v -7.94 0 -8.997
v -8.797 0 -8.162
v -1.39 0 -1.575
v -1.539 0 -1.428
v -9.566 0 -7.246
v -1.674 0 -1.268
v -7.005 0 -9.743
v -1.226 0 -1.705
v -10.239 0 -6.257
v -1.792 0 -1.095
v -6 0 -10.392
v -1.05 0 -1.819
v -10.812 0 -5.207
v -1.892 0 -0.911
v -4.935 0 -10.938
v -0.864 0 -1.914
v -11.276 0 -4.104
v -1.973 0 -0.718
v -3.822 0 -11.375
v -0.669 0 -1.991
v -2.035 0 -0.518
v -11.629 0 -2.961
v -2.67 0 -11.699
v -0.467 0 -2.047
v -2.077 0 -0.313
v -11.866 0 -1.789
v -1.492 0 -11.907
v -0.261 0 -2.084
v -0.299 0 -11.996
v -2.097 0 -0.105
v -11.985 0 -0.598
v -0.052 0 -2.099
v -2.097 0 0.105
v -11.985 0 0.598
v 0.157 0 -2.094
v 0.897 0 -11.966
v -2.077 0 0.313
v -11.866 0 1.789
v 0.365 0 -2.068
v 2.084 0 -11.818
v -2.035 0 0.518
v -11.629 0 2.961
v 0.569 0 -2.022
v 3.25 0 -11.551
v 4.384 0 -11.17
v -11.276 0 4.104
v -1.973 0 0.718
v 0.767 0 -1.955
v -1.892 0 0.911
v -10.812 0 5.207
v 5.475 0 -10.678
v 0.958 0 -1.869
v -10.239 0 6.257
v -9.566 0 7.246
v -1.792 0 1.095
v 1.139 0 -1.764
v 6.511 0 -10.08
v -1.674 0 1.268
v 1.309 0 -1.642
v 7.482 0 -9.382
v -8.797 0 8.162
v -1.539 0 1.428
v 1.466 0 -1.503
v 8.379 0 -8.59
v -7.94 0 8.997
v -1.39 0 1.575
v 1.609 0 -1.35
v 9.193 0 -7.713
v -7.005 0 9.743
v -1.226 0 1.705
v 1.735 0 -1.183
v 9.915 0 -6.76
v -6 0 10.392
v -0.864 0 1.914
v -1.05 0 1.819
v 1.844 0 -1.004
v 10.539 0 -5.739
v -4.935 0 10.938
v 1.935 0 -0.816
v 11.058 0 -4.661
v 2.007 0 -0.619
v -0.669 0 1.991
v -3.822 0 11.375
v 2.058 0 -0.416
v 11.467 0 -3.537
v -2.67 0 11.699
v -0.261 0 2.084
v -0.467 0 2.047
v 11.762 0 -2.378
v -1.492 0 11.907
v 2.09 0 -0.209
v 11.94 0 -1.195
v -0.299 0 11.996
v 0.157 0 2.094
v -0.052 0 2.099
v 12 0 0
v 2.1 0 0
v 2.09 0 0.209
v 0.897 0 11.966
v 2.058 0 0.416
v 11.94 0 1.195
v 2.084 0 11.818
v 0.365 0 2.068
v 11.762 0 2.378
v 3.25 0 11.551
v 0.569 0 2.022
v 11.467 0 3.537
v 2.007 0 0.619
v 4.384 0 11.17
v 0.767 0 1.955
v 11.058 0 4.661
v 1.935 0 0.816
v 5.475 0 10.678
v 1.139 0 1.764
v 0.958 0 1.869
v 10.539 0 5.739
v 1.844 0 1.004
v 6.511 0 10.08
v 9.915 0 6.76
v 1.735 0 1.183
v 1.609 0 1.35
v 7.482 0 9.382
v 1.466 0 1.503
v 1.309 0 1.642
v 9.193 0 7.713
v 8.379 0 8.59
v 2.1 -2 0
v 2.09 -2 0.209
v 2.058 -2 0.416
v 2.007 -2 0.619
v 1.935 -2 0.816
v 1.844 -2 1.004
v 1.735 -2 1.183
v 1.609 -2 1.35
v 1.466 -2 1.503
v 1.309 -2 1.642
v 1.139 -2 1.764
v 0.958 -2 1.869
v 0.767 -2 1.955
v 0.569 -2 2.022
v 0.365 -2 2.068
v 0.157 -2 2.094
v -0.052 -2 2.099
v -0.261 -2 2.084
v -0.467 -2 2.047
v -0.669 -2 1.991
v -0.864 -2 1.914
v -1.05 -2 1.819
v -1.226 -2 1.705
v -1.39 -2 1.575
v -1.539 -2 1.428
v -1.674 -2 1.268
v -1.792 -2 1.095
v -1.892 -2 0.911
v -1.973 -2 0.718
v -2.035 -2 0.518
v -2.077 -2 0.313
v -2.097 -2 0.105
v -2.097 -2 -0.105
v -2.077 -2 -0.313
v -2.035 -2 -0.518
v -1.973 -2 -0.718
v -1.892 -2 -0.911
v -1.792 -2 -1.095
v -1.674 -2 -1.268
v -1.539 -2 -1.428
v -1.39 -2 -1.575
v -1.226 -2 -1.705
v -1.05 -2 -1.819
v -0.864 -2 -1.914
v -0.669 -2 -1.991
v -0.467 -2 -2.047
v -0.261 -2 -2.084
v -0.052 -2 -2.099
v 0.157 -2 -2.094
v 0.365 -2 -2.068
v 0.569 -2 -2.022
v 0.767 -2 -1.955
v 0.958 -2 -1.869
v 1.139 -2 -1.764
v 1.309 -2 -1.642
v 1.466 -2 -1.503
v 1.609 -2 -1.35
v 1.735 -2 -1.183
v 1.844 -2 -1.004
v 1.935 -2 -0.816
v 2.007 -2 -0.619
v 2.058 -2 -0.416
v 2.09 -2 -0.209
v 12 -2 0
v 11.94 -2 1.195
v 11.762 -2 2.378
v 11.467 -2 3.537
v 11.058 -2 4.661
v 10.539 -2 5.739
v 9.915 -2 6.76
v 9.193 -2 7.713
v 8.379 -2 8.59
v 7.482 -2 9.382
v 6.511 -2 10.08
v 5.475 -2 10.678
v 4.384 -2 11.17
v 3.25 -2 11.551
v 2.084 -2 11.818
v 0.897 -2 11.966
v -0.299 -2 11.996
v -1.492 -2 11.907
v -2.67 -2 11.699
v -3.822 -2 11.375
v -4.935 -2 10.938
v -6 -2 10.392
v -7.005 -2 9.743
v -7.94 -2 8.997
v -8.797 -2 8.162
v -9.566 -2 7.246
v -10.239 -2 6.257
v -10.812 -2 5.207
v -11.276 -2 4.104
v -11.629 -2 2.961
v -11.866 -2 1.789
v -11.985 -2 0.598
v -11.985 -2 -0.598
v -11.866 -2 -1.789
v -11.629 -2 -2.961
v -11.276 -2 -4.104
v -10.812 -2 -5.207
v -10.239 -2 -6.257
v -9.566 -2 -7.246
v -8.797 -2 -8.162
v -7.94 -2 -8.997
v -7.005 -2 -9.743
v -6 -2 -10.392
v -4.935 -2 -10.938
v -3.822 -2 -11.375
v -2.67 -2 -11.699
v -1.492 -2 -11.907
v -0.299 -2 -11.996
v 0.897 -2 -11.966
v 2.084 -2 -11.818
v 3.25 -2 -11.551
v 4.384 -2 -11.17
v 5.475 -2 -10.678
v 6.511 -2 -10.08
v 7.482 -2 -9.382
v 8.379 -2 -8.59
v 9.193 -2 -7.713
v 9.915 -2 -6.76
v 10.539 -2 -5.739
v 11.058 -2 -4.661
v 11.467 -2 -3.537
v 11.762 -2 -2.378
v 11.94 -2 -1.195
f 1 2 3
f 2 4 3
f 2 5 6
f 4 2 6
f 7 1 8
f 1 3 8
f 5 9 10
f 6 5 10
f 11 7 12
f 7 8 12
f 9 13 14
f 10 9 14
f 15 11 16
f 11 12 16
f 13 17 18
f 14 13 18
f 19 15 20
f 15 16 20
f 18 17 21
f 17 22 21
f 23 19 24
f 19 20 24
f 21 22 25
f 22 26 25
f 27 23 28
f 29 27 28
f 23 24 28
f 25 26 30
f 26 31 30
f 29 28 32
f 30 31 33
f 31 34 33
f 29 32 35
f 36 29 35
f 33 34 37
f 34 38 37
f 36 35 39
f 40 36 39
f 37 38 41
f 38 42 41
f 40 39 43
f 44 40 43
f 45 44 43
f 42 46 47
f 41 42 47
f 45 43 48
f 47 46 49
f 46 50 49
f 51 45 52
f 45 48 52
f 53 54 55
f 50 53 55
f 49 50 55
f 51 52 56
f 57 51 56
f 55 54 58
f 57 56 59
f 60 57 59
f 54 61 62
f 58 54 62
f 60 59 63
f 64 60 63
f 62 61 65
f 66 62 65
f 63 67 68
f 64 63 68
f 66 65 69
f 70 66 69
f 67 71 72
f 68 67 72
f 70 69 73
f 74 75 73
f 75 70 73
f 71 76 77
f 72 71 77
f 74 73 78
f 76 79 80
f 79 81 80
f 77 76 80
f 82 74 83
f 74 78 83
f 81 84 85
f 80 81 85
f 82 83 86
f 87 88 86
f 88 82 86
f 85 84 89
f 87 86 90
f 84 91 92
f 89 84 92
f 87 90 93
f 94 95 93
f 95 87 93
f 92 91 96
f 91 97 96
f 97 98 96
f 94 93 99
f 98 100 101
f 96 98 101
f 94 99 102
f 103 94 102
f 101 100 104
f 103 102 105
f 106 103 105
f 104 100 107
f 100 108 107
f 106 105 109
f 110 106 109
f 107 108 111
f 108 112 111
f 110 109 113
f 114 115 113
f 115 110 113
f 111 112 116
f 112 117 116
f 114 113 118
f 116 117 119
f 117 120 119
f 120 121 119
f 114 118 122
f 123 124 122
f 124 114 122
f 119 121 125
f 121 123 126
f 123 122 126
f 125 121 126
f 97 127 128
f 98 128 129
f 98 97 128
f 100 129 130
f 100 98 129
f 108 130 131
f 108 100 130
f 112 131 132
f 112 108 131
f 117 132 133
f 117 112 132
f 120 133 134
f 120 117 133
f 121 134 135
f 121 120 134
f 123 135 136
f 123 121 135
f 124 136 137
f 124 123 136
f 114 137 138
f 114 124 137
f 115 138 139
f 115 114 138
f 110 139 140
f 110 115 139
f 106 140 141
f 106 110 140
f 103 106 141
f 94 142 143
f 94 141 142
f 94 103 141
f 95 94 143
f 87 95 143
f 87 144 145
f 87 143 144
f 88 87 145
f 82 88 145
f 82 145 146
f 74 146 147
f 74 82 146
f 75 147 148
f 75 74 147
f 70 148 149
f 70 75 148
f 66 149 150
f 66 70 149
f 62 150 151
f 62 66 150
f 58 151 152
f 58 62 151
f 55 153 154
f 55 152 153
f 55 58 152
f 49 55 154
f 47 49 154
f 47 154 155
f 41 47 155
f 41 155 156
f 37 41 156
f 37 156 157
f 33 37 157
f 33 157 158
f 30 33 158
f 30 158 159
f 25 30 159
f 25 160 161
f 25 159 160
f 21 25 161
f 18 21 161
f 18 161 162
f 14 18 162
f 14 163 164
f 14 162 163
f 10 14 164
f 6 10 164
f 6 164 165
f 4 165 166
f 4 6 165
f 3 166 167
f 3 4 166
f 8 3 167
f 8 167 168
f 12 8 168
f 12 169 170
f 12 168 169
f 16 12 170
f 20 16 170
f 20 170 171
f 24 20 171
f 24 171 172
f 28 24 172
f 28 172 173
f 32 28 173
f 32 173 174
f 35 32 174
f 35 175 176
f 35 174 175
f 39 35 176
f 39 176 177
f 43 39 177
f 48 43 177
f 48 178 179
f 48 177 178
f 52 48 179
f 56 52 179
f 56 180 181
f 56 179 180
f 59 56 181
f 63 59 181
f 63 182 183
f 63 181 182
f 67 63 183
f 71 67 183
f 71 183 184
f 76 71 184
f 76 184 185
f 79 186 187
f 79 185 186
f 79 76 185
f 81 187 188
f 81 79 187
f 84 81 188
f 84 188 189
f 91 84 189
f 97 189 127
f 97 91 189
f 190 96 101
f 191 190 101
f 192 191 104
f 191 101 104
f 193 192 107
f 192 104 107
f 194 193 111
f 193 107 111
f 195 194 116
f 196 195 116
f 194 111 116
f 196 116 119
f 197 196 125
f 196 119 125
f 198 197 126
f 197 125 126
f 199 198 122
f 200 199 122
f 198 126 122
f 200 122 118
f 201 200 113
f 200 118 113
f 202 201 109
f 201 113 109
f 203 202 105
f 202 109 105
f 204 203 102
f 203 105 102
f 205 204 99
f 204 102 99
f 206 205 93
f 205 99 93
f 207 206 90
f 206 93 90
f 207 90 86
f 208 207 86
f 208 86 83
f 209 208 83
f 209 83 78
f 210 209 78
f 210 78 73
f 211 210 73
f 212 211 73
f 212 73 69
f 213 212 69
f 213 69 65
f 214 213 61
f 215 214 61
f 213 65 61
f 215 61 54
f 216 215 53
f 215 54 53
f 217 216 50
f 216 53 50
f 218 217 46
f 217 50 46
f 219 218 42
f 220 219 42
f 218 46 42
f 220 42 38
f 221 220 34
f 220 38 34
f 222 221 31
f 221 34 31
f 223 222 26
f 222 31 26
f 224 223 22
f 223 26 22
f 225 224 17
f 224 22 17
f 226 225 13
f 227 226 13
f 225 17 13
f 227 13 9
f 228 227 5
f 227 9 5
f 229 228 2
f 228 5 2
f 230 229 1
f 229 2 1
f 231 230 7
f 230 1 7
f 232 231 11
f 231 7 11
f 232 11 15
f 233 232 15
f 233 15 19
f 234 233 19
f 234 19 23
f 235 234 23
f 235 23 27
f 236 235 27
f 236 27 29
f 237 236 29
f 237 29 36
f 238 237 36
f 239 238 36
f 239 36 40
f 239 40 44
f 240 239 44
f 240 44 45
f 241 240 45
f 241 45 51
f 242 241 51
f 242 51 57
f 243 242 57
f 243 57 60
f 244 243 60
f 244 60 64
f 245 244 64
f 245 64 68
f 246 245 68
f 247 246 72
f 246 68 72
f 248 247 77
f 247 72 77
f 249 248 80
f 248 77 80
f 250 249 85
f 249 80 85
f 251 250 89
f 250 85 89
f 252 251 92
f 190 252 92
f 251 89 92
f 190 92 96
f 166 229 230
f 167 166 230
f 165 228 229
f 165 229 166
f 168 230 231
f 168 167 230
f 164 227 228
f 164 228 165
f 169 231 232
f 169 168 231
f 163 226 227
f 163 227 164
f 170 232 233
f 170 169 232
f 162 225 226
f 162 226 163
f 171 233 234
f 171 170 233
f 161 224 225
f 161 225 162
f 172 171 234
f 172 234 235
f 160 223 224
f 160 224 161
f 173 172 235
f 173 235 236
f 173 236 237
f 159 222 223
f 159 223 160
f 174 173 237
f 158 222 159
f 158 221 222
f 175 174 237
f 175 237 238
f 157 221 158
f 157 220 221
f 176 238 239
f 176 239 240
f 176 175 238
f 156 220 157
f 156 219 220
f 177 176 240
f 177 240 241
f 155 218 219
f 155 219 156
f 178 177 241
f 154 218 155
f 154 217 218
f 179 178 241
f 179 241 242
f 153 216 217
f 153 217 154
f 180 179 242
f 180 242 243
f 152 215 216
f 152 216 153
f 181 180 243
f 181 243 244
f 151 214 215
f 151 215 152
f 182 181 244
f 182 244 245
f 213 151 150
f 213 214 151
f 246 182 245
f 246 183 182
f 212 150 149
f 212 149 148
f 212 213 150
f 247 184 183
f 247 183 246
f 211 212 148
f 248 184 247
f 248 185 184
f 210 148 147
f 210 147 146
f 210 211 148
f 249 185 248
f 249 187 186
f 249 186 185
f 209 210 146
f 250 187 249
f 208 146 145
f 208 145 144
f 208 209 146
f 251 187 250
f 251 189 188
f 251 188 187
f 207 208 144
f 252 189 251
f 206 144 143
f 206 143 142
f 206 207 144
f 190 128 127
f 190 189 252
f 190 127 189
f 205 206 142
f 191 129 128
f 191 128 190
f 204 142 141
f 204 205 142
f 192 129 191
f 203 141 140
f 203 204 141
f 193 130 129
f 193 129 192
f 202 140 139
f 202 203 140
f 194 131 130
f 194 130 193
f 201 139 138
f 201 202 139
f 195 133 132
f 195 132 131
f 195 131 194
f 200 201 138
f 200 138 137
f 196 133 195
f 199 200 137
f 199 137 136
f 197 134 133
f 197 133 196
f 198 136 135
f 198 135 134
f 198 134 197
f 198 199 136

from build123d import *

# Parameters (mm, degrees)
CYLINDER011007_R     = 2.1
CYLINDER011007_DEPTH = 20
CYLINDER011008_R     = 12
CYLINDER011008_DEPTH = 2


with BuildPart() as belt_attach_insert_hole:
    # Cylinder011007 → Cylinder011007 (new body)
    with BuildSketch(Plane.XZ):
        Circle(CYLINDER011007_R)
    extrude(amount=CYLINDER011007_DEPTH)


with BuildPart() as belt_attach_washer_cut:
    # Cylinder011008 → Cylinder011008 (new body)
    with BuildSketch(Plane.XZ):
        Circle(CYLINDER011008_R)
    extrude(amount=CYLINDER011008_DEPTH)

    # Cut023015009008: cut belt attach insert hole
    add(belt_attach_insert_hole.part, mode=Mode.SUBTRACT)


solid = belt_attach_washer_cut.part
